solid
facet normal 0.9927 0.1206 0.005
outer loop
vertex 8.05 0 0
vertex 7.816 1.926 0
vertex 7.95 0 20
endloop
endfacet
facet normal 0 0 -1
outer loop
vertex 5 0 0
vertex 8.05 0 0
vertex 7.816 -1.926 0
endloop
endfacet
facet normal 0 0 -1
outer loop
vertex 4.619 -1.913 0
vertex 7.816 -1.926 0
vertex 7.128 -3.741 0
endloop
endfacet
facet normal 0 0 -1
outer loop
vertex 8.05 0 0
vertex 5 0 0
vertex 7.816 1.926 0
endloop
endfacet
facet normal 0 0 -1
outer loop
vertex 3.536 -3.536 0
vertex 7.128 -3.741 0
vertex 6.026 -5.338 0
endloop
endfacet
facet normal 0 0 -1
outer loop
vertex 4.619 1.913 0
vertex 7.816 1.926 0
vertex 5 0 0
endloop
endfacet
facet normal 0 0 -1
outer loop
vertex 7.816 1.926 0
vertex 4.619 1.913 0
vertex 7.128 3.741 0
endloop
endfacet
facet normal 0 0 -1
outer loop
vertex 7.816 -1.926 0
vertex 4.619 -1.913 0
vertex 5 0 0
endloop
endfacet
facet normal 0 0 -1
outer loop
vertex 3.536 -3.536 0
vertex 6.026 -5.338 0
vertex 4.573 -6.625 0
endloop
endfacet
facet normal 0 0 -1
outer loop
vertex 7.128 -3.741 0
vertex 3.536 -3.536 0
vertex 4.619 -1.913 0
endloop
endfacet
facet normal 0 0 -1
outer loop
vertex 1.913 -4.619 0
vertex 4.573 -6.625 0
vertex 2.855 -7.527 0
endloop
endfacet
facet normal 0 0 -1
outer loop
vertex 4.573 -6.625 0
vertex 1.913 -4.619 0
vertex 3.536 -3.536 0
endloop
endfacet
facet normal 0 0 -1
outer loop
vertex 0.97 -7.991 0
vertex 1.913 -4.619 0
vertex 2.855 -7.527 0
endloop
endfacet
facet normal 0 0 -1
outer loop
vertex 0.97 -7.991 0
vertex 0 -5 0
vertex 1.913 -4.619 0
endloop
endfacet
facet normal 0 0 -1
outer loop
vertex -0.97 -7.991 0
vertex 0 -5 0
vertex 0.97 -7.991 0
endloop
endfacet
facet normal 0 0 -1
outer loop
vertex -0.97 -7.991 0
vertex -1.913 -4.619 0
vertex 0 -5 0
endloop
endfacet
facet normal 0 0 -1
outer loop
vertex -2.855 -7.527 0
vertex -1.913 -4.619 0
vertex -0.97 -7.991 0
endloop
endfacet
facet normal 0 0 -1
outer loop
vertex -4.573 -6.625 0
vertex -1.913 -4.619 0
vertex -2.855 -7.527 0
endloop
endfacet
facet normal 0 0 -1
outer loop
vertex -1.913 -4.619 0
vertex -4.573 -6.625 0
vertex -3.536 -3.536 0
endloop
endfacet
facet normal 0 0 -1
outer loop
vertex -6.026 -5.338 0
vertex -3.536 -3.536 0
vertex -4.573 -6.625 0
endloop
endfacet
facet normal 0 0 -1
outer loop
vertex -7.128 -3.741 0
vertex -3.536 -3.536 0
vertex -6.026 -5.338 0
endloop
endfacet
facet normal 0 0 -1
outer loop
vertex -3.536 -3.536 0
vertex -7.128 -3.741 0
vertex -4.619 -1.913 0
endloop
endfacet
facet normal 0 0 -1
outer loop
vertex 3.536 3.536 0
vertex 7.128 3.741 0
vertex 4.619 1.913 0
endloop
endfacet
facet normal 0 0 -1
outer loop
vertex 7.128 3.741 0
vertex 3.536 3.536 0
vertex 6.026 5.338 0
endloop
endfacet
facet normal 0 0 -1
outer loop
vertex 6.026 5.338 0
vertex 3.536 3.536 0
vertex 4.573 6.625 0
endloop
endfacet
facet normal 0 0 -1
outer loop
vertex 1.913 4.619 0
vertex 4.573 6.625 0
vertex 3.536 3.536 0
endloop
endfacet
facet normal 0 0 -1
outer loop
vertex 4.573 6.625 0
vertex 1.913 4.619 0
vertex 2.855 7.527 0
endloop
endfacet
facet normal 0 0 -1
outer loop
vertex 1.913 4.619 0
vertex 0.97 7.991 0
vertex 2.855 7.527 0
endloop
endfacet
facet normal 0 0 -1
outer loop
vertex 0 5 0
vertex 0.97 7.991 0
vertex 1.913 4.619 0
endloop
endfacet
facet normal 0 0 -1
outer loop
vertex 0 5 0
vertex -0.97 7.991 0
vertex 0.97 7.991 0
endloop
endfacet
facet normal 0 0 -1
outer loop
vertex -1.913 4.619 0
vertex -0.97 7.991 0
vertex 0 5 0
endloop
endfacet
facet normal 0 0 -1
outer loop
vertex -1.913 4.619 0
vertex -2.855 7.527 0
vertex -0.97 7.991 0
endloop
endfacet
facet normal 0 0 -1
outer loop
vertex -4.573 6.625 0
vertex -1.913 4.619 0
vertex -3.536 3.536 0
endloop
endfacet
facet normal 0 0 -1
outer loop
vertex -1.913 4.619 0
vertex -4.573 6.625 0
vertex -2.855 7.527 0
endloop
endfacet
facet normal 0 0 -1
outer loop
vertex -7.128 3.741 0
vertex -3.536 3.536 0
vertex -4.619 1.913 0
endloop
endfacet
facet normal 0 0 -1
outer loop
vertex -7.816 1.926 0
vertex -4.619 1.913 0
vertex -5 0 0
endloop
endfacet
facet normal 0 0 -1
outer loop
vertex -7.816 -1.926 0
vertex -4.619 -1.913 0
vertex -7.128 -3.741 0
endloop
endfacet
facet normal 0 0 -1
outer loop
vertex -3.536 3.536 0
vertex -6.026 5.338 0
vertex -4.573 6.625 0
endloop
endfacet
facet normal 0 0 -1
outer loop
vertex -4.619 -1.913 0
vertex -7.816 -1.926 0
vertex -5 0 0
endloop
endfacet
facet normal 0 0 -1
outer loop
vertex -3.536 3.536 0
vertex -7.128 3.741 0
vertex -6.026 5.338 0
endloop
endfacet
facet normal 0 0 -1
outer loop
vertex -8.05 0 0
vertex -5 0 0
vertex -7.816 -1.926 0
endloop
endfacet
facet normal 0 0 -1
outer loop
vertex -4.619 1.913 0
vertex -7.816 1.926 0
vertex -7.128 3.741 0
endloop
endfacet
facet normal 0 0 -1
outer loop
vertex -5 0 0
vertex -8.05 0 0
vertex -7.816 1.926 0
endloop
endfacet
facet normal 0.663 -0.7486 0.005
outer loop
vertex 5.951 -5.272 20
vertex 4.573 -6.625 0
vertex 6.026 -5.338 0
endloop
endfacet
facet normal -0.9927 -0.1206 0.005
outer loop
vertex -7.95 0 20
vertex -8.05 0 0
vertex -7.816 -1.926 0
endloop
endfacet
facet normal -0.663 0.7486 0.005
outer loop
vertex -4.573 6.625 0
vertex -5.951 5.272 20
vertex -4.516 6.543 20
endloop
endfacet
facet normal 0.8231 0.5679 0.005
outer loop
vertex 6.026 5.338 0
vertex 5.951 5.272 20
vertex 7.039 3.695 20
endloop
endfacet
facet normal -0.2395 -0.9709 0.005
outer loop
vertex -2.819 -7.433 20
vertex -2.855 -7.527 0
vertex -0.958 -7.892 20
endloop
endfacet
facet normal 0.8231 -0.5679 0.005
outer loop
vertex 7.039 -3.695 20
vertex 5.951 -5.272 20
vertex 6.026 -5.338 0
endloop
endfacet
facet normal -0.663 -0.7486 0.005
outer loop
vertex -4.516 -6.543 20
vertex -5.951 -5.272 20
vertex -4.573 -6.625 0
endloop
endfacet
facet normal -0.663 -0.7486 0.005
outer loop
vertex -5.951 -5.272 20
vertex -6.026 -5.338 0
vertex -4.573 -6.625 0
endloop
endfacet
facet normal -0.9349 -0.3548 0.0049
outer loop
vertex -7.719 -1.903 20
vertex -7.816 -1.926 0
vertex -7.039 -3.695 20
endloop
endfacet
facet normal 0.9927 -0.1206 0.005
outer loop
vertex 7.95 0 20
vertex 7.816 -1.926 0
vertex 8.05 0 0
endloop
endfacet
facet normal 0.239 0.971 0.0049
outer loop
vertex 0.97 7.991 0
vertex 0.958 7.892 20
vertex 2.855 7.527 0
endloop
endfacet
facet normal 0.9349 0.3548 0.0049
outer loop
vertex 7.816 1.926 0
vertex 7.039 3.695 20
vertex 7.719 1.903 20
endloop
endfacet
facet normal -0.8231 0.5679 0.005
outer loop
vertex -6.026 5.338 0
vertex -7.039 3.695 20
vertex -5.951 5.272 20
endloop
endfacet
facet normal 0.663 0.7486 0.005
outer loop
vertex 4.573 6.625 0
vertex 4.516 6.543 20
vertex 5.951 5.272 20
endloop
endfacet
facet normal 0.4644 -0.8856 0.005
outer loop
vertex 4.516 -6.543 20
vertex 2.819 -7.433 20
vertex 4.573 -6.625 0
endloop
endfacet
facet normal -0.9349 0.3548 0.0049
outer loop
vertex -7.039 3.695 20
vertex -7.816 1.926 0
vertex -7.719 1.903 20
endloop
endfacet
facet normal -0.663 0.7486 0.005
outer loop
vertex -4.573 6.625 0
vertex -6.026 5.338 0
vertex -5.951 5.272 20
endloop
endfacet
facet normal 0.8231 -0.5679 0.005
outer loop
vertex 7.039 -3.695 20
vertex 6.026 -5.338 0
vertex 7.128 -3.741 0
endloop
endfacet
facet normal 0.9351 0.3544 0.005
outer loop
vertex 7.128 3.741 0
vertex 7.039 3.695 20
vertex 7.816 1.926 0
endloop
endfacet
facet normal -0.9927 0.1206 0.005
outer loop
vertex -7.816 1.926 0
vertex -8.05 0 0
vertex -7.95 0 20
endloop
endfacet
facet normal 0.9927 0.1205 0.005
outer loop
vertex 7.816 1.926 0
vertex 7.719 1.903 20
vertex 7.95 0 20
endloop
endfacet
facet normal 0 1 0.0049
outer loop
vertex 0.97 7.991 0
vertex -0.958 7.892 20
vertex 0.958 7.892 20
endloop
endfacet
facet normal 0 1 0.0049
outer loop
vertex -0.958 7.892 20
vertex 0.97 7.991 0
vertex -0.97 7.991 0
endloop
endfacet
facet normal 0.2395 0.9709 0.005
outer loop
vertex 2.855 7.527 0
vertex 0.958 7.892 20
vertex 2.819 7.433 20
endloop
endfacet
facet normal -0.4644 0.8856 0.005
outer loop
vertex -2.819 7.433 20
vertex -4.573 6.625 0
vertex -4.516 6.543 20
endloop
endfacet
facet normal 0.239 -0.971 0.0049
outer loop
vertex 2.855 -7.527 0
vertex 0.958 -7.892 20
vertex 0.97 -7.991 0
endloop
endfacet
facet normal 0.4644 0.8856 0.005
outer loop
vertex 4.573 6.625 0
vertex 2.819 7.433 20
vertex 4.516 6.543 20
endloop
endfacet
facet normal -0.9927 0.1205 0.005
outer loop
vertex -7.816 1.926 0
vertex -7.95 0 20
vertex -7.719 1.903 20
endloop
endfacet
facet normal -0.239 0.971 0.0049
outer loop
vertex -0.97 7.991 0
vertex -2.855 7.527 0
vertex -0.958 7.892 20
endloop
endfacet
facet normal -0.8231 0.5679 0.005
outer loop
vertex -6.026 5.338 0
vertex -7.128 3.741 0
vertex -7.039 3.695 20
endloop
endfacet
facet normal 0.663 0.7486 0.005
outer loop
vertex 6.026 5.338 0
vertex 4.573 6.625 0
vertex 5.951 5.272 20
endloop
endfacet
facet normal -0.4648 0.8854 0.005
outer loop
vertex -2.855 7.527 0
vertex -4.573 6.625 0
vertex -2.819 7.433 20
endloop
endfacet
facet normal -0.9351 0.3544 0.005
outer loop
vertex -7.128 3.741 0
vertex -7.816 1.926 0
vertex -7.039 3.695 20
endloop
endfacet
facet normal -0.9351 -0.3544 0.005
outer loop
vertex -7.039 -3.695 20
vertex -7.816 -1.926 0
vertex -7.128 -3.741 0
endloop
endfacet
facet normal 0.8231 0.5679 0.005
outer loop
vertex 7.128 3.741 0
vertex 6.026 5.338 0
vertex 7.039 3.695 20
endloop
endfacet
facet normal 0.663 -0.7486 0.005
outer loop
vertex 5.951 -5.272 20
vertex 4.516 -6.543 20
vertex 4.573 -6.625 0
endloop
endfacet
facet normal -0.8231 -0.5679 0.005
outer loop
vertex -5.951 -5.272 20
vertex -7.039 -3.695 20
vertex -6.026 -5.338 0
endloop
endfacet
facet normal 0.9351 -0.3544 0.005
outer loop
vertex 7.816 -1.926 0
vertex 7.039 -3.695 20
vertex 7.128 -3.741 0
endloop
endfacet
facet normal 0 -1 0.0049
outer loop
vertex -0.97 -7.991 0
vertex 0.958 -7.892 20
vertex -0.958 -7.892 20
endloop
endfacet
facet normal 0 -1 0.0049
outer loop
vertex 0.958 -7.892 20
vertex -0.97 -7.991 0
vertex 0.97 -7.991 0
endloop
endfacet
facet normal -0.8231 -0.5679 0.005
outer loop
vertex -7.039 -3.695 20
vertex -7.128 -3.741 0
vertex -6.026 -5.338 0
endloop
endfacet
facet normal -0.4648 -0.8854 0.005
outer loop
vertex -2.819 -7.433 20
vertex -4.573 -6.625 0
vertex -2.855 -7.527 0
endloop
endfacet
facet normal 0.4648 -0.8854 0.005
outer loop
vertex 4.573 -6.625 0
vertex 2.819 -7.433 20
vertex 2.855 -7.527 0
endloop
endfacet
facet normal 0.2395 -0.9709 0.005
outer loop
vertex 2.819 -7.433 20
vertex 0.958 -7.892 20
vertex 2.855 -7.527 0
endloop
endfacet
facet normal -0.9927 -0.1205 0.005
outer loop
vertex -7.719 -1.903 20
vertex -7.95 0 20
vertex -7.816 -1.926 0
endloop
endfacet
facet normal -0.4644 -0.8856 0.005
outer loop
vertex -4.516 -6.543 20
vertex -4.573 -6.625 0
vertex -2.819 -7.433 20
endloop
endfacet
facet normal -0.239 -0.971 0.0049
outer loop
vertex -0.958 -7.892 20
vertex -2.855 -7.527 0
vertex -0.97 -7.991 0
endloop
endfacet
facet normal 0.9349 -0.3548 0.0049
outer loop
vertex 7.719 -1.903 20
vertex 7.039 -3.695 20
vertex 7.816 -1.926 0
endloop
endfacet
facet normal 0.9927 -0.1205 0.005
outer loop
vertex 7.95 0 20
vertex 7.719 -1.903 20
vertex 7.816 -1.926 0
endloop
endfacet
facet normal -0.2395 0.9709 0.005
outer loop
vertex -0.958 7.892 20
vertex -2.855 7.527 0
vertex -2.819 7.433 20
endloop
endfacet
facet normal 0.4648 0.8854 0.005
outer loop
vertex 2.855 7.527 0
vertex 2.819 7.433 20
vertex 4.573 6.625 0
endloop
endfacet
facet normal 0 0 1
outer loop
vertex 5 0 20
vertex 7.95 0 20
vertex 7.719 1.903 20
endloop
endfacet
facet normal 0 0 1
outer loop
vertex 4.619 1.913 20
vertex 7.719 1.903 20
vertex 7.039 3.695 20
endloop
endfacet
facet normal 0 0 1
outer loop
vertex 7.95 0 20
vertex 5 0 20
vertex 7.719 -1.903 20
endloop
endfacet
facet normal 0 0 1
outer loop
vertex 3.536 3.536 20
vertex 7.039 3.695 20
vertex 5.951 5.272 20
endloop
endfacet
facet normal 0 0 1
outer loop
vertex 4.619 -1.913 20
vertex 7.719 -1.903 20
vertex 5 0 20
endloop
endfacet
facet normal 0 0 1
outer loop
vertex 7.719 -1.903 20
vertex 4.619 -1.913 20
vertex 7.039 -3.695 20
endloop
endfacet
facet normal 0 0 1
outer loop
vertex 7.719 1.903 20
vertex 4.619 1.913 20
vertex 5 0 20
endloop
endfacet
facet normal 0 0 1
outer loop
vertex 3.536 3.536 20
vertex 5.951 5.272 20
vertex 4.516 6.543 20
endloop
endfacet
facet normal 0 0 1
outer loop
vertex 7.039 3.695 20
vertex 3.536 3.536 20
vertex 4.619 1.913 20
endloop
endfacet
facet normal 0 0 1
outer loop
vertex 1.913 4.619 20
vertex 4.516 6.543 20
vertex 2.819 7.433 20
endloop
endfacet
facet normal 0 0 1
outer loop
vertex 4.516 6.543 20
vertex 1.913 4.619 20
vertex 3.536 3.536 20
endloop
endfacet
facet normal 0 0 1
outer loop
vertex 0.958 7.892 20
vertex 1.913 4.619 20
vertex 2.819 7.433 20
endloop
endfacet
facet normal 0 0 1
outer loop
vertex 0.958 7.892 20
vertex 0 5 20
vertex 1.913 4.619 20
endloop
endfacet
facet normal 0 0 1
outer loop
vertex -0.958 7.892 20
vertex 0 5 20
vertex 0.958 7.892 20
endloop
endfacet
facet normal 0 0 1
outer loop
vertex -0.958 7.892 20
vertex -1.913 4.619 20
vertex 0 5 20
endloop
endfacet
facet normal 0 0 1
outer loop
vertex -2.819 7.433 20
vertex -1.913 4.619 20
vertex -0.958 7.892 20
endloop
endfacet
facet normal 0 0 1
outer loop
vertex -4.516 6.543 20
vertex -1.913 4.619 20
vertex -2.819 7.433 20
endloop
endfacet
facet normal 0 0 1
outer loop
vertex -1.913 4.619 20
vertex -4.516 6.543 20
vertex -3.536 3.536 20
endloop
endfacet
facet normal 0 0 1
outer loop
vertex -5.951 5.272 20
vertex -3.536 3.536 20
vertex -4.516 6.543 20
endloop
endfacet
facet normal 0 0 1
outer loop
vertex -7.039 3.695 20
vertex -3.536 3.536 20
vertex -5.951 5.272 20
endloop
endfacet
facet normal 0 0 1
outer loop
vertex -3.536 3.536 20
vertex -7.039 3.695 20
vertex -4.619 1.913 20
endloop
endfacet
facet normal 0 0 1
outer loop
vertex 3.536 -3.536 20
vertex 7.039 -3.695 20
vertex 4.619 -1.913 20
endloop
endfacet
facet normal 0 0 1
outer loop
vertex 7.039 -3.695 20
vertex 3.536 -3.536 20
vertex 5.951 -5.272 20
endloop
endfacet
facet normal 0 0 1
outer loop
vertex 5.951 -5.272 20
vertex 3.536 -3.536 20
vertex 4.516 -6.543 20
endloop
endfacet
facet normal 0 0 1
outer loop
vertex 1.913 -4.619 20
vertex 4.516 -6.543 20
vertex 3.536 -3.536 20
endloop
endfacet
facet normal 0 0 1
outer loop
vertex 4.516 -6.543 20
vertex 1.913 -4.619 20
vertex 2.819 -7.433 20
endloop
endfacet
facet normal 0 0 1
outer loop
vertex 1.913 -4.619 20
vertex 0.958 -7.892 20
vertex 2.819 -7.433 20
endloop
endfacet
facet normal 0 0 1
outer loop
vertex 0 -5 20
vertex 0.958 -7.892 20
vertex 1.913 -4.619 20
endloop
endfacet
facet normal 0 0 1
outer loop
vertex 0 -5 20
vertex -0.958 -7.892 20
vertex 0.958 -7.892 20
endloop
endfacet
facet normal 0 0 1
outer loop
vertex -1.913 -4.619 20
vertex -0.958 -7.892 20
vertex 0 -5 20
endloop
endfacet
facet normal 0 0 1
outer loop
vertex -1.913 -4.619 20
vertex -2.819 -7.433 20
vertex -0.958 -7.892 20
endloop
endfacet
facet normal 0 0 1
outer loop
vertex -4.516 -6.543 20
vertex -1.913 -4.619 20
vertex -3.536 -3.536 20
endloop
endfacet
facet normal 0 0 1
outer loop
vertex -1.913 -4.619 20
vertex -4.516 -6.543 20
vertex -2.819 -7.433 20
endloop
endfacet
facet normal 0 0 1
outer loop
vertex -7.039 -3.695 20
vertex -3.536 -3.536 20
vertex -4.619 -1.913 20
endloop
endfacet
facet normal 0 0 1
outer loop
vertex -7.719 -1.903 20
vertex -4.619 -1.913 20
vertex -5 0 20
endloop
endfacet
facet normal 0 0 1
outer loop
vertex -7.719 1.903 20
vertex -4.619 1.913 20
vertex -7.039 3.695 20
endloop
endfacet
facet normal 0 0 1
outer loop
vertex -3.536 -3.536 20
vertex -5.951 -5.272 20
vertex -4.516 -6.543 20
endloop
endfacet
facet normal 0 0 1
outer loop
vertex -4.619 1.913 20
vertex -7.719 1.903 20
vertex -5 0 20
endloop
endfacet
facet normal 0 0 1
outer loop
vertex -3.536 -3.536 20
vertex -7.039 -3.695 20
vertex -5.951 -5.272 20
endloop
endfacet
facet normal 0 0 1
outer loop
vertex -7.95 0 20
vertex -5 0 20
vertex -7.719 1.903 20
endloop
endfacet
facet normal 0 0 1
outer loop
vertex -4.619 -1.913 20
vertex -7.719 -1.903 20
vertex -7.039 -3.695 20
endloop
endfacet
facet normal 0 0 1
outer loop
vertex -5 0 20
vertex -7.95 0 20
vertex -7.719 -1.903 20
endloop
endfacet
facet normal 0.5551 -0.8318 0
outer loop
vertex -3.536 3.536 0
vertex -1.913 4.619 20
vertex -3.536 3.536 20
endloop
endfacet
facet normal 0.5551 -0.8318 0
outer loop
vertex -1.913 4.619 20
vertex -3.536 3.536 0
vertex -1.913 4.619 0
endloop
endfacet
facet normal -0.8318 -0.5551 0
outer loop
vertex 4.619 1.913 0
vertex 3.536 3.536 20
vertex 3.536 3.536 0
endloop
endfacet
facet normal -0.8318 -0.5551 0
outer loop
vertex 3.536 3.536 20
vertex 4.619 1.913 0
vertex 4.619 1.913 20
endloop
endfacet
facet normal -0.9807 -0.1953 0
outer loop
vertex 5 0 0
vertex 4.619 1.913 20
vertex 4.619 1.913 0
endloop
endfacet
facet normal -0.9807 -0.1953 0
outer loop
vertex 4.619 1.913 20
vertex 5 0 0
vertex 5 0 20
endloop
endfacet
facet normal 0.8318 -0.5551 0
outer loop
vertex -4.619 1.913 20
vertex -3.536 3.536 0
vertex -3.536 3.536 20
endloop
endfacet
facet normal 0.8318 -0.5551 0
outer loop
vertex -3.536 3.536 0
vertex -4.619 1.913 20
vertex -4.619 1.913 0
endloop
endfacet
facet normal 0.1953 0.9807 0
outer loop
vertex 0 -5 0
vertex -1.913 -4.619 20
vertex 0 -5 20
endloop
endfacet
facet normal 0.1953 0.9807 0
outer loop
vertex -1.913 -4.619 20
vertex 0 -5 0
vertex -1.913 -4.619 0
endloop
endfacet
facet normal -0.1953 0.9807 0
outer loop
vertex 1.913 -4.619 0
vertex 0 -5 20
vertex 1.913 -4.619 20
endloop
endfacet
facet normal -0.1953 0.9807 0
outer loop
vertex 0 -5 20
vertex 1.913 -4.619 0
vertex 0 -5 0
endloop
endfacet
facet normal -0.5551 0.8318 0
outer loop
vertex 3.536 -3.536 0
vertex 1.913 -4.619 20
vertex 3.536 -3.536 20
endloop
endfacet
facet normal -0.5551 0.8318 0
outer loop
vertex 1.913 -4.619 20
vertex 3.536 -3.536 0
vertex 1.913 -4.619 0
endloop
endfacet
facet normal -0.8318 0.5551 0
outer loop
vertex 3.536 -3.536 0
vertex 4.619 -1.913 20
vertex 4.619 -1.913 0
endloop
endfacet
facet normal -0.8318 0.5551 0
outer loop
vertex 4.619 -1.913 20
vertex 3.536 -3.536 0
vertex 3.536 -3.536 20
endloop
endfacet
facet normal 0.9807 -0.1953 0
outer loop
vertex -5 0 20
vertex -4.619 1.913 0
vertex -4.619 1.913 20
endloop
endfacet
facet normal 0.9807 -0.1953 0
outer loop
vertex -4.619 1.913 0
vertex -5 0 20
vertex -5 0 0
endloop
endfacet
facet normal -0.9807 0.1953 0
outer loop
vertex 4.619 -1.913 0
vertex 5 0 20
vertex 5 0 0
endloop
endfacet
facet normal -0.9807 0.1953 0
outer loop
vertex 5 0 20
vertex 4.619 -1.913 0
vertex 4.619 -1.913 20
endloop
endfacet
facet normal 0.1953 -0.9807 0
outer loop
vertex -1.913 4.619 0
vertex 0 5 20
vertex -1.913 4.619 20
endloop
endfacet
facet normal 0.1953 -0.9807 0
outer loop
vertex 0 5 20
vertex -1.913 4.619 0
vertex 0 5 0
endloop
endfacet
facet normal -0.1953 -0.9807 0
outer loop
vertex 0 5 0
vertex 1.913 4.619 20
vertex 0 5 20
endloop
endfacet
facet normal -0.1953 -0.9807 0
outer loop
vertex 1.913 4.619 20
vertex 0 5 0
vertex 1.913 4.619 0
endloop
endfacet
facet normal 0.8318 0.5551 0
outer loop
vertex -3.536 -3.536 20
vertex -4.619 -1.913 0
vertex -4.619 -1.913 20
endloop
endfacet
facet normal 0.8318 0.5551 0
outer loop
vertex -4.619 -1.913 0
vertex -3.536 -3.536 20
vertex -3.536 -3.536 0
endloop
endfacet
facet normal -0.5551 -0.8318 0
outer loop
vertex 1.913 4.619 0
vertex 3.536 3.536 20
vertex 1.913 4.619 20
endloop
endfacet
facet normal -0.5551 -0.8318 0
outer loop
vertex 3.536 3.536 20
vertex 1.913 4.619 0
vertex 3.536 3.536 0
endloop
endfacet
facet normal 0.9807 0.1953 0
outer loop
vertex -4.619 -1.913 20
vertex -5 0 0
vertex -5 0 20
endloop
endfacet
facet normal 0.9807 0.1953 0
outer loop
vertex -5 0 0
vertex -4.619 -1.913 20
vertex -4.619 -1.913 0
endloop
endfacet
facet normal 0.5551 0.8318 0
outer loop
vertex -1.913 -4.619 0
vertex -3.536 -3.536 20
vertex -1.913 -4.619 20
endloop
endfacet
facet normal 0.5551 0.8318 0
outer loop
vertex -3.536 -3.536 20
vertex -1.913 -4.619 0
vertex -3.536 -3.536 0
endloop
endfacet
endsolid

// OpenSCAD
//16 mm tube

difference()
{cylinder(20,8.05,7.95);
translate([0,0,-1])
    {cylinder(25,5,5);}
}
